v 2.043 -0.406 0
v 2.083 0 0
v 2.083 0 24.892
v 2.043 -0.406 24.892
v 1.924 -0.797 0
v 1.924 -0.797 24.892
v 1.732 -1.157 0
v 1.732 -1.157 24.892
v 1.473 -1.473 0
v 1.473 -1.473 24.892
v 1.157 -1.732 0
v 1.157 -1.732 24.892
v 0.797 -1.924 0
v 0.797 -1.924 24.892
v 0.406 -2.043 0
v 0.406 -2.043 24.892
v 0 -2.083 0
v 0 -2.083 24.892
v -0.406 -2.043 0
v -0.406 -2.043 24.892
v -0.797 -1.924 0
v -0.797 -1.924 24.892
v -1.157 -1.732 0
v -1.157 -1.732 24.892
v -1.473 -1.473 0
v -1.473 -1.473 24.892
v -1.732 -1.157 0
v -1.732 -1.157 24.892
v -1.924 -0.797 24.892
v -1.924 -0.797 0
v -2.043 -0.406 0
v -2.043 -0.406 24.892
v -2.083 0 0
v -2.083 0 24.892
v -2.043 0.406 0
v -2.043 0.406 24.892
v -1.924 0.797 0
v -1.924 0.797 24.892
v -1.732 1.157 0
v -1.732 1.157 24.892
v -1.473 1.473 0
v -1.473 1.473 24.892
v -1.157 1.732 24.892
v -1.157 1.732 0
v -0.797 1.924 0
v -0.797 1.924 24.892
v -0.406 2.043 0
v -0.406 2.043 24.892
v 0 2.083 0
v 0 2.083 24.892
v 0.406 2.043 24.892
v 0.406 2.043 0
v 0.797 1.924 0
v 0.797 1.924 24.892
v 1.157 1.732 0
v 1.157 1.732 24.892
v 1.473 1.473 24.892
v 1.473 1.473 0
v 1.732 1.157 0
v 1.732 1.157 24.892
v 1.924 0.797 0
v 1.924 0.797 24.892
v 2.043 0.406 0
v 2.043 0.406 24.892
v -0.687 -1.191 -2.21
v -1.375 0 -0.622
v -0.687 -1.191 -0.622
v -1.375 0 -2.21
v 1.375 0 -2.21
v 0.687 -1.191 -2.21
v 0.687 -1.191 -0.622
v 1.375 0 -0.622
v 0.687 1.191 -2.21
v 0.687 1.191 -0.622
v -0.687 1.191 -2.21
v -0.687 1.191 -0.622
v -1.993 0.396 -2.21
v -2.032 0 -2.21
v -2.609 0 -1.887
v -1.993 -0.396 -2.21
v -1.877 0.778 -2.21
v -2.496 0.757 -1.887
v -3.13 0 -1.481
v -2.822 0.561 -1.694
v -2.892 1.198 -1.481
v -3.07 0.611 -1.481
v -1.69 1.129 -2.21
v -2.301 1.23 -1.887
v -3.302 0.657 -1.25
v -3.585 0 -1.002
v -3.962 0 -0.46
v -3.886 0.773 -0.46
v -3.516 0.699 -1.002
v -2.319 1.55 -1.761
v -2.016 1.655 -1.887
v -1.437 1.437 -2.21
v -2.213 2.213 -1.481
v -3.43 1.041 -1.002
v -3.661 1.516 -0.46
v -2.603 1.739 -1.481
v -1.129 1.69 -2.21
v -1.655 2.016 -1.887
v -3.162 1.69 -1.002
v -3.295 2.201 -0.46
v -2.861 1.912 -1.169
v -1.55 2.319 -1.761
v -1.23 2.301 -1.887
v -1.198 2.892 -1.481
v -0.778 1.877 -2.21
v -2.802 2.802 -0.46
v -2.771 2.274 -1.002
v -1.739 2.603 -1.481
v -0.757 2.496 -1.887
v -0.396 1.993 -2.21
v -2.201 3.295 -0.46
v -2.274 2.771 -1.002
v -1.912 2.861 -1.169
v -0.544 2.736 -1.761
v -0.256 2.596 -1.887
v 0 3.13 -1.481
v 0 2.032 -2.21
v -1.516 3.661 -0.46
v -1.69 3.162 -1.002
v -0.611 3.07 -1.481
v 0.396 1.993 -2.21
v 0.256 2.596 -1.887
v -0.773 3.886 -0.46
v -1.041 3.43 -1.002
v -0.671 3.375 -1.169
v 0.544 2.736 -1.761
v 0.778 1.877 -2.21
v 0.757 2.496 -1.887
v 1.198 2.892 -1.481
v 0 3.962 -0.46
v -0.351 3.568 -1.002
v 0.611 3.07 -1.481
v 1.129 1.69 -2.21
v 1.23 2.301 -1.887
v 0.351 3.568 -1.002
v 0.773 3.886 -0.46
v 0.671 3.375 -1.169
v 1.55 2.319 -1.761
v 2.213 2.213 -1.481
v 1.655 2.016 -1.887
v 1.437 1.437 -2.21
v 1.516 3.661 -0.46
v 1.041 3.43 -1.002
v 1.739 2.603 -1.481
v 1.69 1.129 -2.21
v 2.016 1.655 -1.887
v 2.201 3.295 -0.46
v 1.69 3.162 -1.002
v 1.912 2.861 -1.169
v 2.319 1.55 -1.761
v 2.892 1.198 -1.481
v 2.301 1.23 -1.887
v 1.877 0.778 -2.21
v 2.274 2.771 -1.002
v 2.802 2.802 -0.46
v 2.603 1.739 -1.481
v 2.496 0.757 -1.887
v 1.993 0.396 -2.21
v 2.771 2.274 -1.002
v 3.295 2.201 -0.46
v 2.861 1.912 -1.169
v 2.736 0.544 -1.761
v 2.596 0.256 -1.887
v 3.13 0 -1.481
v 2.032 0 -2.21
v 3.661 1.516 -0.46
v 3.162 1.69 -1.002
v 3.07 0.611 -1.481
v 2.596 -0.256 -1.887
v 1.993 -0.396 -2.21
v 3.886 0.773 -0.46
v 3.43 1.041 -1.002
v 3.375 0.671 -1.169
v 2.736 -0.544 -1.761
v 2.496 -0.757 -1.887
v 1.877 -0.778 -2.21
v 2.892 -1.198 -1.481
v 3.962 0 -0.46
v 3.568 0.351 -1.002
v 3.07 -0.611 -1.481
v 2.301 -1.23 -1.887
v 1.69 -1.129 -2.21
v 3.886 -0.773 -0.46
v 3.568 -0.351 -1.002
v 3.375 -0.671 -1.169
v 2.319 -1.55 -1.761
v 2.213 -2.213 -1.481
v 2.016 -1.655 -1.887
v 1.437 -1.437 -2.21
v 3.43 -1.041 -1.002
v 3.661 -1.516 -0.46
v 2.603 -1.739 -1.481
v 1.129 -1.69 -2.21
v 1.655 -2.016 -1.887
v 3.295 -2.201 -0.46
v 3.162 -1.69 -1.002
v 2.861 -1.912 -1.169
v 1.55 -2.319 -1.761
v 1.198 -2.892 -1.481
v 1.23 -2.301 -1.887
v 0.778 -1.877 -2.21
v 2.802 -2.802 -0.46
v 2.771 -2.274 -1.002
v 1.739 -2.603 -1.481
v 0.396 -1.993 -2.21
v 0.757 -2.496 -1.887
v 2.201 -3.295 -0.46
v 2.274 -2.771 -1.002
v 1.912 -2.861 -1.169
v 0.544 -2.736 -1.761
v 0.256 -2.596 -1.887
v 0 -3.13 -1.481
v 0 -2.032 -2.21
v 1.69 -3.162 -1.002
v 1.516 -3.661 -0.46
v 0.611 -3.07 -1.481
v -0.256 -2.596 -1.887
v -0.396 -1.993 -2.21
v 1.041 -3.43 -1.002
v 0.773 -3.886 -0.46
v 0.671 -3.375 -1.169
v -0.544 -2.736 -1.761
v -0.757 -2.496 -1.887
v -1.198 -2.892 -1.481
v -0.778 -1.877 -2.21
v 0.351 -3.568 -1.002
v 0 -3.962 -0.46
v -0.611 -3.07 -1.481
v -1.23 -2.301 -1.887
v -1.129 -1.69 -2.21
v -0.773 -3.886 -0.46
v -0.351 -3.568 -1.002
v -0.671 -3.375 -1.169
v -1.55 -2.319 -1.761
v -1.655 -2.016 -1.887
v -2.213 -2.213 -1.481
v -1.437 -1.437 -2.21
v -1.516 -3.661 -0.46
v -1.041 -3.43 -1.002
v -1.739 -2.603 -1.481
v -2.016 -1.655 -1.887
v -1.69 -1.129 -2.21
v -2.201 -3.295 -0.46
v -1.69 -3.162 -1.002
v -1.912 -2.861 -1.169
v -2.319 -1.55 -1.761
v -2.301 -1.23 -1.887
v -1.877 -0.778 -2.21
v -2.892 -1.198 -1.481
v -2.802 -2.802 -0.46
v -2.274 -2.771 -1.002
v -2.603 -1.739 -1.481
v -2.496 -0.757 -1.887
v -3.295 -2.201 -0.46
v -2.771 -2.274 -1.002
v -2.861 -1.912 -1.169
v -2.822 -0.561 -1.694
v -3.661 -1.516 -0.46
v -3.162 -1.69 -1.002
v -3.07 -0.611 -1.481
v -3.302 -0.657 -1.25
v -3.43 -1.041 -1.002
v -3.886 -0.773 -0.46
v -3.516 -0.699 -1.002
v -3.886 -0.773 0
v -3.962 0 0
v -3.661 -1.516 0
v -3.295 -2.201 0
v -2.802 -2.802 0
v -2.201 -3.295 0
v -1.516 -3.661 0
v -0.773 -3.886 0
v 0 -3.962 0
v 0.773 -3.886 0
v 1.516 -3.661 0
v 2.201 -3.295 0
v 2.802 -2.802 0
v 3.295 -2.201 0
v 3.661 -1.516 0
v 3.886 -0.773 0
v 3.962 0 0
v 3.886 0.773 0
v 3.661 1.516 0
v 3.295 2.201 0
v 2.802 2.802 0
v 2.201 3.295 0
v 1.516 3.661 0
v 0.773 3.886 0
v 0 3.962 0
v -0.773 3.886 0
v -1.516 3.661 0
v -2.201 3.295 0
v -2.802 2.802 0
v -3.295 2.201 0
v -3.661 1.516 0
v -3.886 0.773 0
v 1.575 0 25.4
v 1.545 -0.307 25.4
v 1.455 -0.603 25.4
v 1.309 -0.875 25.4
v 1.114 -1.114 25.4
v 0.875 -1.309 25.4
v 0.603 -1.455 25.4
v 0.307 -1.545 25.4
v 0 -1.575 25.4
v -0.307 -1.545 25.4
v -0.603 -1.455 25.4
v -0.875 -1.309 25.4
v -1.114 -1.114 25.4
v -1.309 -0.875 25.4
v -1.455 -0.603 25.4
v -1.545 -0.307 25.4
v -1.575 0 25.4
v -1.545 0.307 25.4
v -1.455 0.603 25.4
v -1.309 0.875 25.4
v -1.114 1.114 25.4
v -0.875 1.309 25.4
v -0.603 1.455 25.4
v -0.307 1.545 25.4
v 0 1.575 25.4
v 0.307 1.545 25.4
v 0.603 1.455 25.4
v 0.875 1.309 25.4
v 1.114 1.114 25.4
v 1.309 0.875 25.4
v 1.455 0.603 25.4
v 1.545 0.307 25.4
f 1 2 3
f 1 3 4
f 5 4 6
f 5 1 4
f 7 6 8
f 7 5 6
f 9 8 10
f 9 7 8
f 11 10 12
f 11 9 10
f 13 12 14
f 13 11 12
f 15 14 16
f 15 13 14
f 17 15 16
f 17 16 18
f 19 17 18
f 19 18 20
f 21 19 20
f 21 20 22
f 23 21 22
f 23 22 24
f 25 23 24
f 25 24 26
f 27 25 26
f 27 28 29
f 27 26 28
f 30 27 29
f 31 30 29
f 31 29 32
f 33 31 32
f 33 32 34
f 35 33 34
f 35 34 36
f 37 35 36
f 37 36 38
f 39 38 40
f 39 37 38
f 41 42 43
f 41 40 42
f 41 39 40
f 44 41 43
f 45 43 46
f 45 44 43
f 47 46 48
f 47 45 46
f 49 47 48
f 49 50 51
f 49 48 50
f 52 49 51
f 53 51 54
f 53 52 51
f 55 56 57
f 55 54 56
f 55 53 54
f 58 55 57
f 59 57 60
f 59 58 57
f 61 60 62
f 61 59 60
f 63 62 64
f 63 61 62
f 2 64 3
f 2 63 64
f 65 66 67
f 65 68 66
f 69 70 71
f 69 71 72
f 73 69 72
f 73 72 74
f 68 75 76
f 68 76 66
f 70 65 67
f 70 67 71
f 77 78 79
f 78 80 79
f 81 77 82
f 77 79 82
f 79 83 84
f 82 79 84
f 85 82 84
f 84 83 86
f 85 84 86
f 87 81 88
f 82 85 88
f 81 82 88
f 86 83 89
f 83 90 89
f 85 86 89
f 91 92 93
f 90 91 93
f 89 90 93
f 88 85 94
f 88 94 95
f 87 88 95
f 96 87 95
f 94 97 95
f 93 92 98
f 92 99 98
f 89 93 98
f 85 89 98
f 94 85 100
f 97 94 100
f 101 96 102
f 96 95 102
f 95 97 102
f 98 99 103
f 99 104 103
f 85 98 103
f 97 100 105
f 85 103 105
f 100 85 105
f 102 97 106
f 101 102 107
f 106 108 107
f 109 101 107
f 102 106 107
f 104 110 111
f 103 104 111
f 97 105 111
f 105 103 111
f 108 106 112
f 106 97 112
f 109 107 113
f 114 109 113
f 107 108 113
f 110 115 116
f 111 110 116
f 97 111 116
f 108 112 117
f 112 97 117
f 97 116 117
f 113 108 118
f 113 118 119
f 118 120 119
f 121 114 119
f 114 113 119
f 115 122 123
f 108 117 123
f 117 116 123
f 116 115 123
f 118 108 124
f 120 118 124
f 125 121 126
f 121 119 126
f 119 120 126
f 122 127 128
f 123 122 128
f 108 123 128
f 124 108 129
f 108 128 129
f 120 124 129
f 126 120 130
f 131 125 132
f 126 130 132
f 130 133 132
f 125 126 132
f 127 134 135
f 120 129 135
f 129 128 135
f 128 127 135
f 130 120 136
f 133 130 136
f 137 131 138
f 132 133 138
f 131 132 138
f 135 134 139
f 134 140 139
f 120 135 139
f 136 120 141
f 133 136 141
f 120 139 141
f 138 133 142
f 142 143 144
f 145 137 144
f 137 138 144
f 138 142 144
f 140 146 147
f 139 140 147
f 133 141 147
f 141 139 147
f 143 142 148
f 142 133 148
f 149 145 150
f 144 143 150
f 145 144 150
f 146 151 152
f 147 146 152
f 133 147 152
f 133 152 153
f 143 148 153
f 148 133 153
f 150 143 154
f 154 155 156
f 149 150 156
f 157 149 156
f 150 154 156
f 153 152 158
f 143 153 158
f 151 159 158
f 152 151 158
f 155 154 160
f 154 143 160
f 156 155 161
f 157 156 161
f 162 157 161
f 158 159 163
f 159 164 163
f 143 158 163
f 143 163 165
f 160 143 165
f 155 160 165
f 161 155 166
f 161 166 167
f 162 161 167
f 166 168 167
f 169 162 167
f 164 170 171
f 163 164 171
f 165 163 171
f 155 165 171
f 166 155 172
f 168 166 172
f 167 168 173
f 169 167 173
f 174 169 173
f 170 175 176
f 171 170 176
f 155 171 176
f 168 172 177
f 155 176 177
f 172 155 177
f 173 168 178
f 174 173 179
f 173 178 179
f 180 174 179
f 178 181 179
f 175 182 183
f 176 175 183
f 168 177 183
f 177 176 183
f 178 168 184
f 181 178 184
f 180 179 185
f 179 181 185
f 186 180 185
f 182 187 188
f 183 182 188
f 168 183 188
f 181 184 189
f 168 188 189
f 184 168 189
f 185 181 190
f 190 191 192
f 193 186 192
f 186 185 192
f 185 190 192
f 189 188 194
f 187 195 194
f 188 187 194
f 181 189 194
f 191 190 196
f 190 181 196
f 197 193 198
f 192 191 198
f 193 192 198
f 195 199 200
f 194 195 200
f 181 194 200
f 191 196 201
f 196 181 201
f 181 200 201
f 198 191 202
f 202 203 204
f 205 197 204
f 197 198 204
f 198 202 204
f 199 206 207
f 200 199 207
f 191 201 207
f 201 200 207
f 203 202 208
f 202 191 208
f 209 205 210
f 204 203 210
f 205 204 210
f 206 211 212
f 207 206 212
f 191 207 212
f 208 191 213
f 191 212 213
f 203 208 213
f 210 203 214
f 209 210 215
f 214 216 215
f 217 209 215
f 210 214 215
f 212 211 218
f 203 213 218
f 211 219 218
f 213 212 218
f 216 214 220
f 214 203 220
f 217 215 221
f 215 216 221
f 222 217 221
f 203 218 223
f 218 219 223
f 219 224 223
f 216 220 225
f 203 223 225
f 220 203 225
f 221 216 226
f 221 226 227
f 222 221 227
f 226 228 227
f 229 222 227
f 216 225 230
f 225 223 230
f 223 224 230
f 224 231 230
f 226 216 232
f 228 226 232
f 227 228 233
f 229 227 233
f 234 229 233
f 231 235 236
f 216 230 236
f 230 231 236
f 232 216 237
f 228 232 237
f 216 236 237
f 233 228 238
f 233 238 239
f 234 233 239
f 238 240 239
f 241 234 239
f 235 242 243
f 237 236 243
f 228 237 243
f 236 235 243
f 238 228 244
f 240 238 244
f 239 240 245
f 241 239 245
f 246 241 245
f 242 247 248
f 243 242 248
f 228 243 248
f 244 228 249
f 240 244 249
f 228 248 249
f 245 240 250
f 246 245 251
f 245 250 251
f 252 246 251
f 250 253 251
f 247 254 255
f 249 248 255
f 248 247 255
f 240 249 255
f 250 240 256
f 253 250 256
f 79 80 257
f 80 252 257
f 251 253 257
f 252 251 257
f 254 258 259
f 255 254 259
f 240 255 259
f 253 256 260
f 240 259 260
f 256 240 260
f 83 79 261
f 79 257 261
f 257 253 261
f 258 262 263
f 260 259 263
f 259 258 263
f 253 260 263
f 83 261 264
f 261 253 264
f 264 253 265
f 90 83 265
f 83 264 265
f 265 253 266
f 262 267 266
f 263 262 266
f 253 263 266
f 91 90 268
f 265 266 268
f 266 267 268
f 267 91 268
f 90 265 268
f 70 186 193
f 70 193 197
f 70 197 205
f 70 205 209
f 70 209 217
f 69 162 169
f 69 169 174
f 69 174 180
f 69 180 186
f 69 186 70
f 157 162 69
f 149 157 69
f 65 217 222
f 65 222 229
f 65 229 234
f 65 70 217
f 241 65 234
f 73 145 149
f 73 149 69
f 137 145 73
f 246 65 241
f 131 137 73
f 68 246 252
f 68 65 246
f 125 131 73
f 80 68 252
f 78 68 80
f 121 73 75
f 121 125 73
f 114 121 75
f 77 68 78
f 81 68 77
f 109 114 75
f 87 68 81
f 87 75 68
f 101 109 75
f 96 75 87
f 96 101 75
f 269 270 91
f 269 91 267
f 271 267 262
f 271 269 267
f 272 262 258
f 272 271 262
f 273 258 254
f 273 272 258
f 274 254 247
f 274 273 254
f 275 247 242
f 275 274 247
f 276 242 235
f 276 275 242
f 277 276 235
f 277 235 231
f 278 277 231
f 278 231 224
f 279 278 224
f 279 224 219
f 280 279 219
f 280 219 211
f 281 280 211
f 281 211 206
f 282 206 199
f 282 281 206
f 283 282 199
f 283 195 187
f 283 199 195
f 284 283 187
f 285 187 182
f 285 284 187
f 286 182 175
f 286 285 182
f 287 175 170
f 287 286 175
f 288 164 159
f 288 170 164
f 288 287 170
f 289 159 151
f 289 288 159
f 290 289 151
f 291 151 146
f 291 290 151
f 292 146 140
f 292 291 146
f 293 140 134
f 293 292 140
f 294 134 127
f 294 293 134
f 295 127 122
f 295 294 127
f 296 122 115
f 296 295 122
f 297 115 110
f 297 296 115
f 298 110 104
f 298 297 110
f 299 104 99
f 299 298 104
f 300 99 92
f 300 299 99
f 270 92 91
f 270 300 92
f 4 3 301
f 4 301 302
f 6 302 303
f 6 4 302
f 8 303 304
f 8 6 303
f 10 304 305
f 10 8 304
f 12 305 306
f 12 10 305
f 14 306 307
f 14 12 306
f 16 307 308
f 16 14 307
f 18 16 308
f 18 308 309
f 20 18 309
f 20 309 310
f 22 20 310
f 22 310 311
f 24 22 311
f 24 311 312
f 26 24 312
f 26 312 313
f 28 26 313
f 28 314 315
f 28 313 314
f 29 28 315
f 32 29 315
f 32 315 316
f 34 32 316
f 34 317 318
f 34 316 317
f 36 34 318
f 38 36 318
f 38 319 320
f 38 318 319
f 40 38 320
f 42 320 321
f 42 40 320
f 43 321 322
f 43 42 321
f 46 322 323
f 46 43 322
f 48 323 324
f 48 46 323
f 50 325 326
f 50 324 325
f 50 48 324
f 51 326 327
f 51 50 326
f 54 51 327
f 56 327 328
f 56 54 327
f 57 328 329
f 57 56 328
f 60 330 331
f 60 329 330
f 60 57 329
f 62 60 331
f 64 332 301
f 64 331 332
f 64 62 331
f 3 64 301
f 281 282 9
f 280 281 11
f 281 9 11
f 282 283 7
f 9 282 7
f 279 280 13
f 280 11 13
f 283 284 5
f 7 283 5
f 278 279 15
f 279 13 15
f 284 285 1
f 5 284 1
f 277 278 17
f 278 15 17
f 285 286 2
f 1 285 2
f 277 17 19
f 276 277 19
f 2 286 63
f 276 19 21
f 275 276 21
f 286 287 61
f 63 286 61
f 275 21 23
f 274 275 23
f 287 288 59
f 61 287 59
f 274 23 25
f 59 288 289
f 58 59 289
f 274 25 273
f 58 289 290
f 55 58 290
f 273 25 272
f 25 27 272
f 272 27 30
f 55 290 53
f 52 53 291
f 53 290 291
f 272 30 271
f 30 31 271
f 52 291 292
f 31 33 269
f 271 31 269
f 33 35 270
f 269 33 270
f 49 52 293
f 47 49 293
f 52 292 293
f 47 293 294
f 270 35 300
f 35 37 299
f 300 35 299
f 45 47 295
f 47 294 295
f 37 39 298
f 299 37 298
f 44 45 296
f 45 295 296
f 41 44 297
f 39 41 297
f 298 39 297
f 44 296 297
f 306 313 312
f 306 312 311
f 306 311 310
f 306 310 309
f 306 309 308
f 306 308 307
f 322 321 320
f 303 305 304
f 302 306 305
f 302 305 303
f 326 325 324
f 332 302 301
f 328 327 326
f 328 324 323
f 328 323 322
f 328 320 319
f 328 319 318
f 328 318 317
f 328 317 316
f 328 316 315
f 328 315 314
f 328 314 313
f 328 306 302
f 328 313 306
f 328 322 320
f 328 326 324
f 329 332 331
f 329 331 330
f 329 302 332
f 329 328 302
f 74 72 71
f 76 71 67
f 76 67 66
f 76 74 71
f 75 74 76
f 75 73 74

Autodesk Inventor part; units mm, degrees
ref_plane "YZ Plane" through (0, 0, 0) normal (1, 0, 0) x (0, 1, 0)
ref_plane "XZ Plane" through (0, 0, 0) normal (0, 1, 0) x (-1, 0, 0)
ref_plane "XY Plane" through (0, 0, 0) normal (0, 0, 1) x (1, 0, 0)
sketch "Sketch1" plane through (0, 0, 0) normal (0, 0, 1) x (1, 0, 0)
  circle A0 centre (0, 0) radius 2.0828
  dimension "d0" = 4.1656
extrude "Extrusion1" add sketch "Sketch1" along normal blind 25.4
sketch "Sketch2" plane through (0, 0, 0) normal (0, 1, 0) x (-1, 0, 0)
  line L0 (0, 0) -> (0, -2.2098)
  line L1 (0, 0) -> (3.9624, 0)
  line L2 (0, -2.2098) -> (2.032, -2.2098)
  line L3 (3.9624, 0) -> (3.9624, 3.6562) construction
  arc A0 (2.032, -2.2098) -> (3.9624, -0.4599) centre (0.1837, 1.7689) ccw
  line L4 (4.5847, 0.6553) -> (4.5847, -0.2608) construction
  line L5 (3.9624, -0.4599) -> (3.9624, 0)
  dimension "d3" = 2.2098
  dimension "d6" = 2.032
  dimension "d19" = 3.9624
revolve "Revolution1" add sketch "Sketch2" angle 360 about axis through (0, 0, 0) along (0, 0, -1)
sketch "Sketch3" plane through (0, 0, -2.2098) normal (0, 0, -1) x (-1, 0, 0)
  circle A0 centre (0, 0) radius 2.032 projected
  line L0 (-0.6874, 1.1906) -> (0.6874, 1.1906)
  line L1 (0.6874, 1.1906) -> (1.3748, 0)
  line L2 (1.3748, 0) -> (0.6874, -1.1906)
  line L3 (0.6874, -1.1906) -> (-0.6874, -1.1906)
  line L4 (-0.6874, -1.1906) -> (-1.3748, 0)
  line L5 (-1.3748, 0) -> (-0.6874, 1.1906)
  dimension "d8" = 2.3813
extrude "Extrusion2" cut sketch "Sketch3" against normal blind 1.5875 contours L0 L1 L2 L3 L4 L5
chamfer "Chamfer1" distance 0.508 angle 45 1 edges at (-2.0828, 0, 25.4)
thread "Thread1" size "8-32 UNC" class "2A" standard "ANSI Unified Screw Threads" full length
properties part number "10-32 x500 button head" material "Steel"
